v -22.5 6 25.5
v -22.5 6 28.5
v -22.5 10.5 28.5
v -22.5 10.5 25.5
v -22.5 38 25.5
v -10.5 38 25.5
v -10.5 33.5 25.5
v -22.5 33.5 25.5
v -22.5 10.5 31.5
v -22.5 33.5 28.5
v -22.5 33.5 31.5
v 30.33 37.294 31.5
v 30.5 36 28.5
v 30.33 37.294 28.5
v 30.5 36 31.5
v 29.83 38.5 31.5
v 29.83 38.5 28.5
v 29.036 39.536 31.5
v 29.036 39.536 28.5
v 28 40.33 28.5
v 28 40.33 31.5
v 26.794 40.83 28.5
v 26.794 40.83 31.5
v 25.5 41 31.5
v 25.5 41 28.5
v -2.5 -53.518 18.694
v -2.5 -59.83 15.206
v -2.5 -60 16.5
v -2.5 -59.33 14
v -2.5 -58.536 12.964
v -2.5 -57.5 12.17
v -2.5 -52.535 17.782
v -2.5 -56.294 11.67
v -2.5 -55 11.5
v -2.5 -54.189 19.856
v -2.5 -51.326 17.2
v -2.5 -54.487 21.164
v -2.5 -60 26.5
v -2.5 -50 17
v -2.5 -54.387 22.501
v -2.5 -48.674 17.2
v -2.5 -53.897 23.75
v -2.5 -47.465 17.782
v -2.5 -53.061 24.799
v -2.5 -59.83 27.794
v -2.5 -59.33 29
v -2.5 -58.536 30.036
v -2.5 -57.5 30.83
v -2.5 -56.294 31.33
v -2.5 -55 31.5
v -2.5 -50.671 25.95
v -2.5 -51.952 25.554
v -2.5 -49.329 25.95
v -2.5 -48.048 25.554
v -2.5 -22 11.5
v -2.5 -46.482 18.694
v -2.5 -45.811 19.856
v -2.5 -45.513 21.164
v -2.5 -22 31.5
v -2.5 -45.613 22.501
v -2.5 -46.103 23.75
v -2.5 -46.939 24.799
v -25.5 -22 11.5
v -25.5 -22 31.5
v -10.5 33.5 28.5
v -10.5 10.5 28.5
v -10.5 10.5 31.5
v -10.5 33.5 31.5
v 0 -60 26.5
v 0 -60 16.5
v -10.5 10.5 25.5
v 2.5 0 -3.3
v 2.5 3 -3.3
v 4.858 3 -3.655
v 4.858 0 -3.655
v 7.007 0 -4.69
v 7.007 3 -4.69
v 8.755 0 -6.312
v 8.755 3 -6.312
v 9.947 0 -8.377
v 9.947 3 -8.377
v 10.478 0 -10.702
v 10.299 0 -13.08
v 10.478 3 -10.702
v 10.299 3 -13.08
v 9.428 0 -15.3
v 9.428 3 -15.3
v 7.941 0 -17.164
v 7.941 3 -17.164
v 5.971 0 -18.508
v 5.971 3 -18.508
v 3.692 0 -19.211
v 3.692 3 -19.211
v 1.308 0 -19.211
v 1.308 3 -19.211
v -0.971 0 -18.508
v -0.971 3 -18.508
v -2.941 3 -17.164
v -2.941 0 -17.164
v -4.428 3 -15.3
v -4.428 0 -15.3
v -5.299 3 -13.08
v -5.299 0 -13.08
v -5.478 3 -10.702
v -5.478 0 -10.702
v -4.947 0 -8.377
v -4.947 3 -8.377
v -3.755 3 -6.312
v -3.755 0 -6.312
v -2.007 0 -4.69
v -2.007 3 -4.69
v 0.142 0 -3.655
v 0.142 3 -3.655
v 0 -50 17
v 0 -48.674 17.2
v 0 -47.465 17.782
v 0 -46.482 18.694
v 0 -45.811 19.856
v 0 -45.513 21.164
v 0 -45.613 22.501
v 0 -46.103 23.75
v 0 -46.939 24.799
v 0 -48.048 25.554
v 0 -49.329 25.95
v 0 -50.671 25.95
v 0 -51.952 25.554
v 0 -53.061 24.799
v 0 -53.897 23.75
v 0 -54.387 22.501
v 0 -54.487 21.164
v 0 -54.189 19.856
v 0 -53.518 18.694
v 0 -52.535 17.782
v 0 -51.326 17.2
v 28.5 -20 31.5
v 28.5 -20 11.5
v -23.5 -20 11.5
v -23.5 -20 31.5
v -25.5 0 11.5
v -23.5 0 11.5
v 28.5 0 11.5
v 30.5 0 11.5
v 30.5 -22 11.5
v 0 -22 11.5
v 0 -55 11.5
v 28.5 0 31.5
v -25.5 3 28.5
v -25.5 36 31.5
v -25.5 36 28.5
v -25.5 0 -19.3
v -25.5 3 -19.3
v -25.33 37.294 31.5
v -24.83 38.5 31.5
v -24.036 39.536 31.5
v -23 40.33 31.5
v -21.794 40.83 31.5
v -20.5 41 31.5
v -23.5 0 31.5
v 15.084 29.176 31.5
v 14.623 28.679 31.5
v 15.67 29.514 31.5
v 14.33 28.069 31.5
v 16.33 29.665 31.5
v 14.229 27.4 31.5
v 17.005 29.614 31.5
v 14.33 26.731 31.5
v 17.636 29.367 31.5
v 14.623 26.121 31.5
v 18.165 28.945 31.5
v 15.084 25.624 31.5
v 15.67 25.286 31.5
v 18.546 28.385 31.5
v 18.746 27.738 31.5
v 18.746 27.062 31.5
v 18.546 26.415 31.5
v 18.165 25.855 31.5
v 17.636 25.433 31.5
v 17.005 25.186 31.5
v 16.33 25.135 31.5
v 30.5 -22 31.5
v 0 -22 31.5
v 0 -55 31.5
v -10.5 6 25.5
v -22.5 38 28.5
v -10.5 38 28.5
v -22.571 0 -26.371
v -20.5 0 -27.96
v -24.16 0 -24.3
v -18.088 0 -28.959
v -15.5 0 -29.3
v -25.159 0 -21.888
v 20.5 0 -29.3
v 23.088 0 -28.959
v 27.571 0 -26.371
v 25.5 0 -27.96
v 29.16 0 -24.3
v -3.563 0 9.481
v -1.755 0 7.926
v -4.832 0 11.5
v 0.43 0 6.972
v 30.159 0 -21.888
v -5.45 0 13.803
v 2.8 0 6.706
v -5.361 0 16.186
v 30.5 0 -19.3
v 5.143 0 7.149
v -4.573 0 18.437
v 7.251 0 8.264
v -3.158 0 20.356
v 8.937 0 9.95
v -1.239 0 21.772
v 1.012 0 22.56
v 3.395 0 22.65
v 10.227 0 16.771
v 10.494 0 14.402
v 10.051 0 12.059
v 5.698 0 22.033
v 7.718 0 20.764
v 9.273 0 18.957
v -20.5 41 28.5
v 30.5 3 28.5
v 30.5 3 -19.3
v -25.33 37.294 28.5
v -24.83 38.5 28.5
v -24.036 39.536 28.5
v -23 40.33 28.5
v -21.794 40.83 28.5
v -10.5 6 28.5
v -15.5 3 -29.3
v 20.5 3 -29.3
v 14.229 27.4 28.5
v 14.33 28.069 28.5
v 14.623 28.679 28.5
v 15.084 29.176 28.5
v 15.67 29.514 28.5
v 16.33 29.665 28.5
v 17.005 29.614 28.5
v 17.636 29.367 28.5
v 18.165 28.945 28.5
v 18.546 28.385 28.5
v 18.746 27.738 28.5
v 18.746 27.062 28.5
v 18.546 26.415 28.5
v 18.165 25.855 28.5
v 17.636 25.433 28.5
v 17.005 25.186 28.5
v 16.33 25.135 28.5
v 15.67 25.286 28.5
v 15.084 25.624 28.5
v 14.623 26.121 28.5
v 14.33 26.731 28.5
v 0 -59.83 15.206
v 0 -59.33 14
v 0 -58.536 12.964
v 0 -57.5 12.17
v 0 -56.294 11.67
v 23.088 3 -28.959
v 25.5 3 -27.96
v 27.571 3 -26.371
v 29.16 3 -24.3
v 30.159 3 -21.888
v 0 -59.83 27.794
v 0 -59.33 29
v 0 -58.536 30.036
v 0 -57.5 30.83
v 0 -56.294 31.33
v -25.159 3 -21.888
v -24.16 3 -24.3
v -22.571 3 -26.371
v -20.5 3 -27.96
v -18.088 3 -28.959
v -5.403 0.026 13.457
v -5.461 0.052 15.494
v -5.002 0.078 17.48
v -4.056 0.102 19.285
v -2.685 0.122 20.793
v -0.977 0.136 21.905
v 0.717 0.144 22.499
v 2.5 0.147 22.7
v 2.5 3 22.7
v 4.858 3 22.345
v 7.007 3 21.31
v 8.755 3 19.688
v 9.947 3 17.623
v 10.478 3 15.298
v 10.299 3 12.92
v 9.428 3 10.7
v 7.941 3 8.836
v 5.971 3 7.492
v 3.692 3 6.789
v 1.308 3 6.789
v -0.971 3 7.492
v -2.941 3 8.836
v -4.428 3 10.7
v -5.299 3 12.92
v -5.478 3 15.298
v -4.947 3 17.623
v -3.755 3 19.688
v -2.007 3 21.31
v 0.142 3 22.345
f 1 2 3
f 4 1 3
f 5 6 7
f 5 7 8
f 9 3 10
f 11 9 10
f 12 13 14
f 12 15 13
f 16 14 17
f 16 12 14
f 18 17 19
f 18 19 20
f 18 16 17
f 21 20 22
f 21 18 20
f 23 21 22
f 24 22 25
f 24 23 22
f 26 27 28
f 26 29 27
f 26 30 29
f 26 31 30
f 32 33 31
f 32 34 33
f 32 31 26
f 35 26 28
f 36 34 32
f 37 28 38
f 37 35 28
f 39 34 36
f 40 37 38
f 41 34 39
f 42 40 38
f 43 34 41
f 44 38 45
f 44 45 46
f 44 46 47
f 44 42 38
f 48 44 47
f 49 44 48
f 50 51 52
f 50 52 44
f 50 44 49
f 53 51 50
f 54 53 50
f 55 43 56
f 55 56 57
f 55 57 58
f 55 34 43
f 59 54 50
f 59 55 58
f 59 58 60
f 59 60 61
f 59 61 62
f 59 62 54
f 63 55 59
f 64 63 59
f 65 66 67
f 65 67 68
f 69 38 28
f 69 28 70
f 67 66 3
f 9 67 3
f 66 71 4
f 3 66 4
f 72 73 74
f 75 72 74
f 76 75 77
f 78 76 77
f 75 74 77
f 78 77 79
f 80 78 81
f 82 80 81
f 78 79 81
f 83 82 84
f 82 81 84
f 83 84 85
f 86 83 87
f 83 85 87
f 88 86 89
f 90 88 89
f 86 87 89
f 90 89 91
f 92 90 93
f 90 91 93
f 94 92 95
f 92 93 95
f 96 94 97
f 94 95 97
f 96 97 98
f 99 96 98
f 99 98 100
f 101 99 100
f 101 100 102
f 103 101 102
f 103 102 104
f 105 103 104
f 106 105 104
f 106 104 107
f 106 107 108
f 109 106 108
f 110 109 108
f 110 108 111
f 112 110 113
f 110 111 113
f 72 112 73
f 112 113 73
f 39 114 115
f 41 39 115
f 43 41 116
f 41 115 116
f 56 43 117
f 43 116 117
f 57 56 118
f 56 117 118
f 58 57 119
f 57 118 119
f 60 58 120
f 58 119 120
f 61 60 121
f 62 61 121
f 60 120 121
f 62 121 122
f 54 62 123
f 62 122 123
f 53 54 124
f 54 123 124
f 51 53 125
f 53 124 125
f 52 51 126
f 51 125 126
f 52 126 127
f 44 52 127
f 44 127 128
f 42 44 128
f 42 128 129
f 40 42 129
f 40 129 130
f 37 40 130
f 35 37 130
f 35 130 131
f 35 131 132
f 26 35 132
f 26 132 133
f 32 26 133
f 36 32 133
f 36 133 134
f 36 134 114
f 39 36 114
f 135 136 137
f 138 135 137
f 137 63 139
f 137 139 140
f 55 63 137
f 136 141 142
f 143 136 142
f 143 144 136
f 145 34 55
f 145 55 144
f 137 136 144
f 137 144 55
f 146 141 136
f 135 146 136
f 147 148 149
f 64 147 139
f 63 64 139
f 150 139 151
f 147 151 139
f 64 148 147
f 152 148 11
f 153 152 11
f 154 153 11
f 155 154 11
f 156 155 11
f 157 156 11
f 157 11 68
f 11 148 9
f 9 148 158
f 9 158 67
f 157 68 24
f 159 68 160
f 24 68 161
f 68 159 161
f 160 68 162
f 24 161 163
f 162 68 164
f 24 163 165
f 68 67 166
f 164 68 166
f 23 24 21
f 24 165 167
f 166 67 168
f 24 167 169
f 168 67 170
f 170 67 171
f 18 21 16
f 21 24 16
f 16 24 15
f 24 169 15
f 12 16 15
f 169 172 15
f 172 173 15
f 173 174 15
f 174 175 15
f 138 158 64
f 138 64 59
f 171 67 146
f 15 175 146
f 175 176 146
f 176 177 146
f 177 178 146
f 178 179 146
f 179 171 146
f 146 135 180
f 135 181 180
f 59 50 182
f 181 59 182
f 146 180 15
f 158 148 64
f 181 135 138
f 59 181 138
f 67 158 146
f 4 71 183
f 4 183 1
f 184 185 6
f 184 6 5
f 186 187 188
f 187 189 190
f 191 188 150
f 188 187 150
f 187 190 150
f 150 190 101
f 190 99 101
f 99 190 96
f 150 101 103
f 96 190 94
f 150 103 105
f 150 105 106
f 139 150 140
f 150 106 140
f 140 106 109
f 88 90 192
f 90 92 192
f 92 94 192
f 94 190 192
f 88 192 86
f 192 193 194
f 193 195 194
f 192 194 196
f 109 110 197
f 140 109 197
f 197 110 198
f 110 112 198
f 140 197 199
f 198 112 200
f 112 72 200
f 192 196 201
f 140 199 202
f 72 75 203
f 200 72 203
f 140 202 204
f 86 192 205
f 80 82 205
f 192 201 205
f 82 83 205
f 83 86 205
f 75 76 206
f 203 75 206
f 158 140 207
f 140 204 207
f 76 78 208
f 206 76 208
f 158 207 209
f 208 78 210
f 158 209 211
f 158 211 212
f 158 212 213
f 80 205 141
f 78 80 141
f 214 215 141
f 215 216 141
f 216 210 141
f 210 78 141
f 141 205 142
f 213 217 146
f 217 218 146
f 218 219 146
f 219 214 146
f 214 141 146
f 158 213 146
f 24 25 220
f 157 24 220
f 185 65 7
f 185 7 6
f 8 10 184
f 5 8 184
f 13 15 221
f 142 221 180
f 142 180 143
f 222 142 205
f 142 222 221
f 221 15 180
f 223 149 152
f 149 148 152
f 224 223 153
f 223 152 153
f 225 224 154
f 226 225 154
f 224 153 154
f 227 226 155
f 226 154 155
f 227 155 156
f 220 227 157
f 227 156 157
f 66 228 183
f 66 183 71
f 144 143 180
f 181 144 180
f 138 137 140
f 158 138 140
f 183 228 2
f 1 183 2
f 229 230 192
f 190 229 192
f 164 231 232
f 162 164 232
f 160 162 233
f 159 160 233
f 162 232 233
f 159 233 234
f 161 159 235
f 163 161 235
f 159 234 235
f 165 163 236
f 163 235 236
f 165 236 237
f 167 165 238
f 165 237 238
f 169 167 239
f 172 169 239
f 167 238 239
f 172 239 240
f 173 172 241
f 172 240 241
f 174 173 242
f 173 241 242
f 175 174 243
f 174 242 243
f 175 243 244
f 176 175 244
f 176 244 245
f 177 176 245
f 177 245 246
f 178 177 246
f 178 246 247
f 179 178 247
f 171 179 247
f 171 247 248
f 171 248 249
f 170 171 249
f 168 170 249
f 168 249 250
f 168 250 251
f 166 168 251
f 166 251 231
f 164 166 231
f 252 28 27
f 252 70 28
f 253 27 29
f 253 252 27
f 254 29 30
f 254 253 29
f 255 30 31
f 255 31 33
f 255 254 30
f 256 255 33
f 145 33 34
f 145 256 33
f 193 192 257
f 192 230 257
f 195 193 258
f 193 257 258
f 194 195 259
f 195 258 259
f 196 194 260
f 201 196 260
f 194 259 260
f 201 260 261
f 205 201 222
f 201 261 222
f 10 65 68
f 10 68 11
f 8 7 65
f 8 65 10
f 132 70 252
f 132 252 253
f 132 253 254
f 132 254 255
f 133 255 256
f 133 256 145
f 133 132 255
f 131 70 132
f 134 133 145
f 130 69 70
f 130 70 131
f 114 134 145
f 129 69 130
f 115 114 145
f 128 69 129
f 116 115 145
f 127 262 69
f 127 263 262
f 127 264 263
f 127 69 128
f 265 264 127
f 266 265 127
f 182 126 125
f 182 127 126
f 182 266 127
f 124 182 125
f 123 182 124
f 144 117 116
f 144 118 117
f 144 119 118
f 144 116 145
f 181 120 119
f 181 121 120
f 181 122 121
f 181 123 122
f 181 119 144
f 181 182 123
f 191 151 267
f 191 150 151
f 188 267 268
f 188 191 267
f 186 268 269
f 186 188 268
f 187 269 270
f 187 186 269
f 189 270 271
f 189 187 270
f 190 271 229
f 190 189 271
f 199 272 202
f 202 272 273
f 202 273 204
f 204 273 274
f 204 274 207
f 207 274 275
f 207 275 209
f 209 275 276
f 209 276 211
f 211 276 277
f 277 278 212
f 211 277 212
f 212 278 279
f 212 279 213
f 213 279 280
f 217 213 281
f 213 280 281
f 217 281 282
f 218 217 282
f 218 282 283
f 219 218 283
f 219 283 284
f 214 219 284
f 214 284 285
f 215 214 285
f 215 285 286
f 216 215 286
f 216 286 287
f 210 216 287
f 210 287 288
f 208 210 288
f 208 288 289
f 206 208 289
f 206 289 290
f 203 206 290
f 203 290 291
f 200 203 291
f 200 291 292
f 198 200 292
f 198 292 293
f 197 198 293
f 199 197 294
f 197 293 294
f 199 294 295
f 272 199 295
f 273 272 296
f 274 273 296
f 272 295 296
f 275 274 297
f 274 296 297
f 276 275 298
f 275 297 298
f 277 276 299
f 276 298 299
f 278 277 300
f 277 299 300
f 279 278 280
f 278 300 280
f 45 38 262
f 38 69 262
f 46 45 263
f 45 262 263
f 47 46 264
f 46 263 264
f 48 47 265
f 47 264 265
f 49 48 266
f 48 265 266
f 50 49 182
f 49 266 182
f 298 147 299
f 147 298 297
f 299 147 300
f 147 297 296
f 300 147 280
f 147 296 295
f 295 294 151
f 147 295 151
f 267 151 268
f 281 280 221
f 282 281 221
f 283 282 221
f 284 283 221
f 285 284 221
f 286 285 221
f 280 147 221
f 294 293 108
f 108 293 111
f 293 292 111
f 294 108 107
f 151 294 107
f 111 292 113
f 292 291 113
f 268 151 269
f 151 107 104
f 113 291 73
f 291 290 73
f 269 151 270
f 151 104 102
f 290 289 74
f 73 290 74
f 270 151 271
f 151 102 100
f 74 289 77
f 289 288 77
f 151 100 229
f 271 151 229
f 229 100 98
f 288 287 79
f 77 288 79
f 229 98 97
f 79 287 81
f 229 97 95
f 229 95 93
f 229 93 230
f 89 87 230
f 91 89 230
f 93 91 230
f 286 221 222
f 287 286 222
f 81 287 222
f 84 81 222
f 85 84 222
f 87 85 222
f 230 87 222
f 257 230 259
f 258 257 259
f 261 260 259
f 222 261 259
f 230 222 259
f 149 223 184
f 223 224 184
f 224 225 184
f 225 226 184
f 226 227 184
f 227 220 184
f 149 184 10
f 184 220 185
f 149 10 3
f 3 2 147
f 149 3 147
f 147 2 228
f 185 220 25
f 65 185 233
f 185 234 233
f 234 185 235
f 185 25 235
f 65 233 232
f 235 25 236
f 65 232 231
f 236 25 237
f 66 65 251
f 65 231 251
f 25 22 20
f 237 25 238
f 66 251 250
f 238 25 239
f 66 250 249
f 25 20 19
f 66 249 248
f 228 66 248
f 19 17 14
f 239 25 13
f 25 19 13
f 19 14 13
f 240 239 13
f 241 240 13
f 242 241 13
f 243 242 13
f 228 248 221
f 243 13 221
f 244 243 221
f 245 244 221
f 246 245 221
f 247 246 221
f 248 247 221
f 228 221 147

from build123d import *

# Parameters (mm, degrees)
SKETCH1_W                = 50
SKETCH1_H                = 57.8
BOSS_EXTRUDE1_DEPTH      = 3
SKETCH1_3_W              = 50
SKETCH1_3_H              = 3
BOSS_EXTRUDE2_DEPTH      = 63
SKETCH7_W                = 10
SKETCH7_H                = 20
BOSS_EXTRUDE6_DEPTH      = 60
SKETCH8_W                = 7.5
SKETCH8_H                = 20
CUT_EXTRUDE4_DEPTH       = 60
SKETCH10_R               = 4.5
CUT_EXTRUDE5_DEPTH       = 60
FILLET1_R                = 5
FILLET2_R                = 5
CUT_EXTRUDE6_REACH       = 93.771
FILLET4_R                = 5
BOSS_EXTRUDE7_DEPTH      = 3
BOSS_EXTRUDE8_DEPTH      = 3
SKETCH15_R               = 8
CUT_EXTRUDE7_DEPTH       = 3
CUT_EXTRUDE8_DEPTH       = 40
BOSS_EXTRUDE9_DEPTH      = 23
BOSS_EXTRUDE9_DEPTH_BACK = 33
SKETCH17_W               = 20
SKETCH17_H               = 2
BOSS_EXTRUDE25_REACH     = 95.87
SKETCH19_W               = 54
SKETCH19_H               = 20
SKETCH19_W_2             = 2
CUT_EXTRUDE9_REACH       = 83.018
CUT_EXTRUDE10_REACH      = 78.756
SKETCH27_R               = 8
SKETCH28_W               = 12
SKETCH28_H               = 4.5
BOSS_EXTRUDE26_DEPTH     = 3
SKETCH28_3_W             = 12
SKETCH28_3_H             = 23
CUT_EXTRUDE11_DEPTH      = 3
SKETCH29_W               = 56
SKETCH29_H               = 22
CUT_EXTRUDE12_DEPTH      = 3
FILLET5_R                = 5
FILLET6_R                = 10
CUT_EXTRUDE13_REACH      = 90.719
SKETCH30_R               = 2.271159968


with BuildPart() as part:
    # Sketch1 → Boss-Extrude1 (new body)
    with BuildSketch(Plane(origin=(0, 0, 0), x_dir=(1, 0, 0), z_dir=(0, 1, 0))):
        with Locations((2.5, 0.4)):
            Rectangle(SKETCH1_W, SKETCH1_H)
    extrude(amount=BOSS_EXTRUDE1_DEPTH)

    # Sketch1<3> → Boss-Extrude2 (add)
    with BuildSketch(Plane(origin=(0, 0, 0), x_dir=(1, 0, 0), z_dir=(0, 1, 0))):
        with Locations((2.5, -30)):
            Rectangle(SKETCH1_3_W, SKETCH1_3_H)
    extrude(amount=BOSS_EXTRUDE2_DEPTH)

    # Sketch7 → Boss-Extrude6 (add)
    with BuildSketch(Plane.XZ):
        with Locations((2.5, 21.5)):
            Rectangle(SKETCH7_W, SKETCH7_H)
    extrude(amount=BOSS_EXTRUDE6_DEPTH)

    # Sketch8 → Cut-Extrude4 (cut)
    with BuildSketch(Plane(origin=(0, 0, 11.5), x_dir=(-1, 0, 0), z_dir=(0, 0, -1))):
        with Locations((-3.75, -50)):
            Rectangle(SKETCH8_W, SKETCH8_H)
    extrude(amount=-CUT_EXTRUDE4_DEPTH, mode=Mode.SUBTRACT)

    # Sketch10 → Cut-Extrude5 (cut)
    with BuildSketch(Plane(origin=(0, 0, 0), x_dir=(0, 0, -1), z_dir=(1, 0, 0))):
        with Locations((-21.5, -50)):
            Circle(SKETCH10_R)
    extrude(amount=-CUT_EXTRUDE5_DEPTH, mode=Mode.SUBTRACT)

    # Fillet1
    fillet1_edges = [part.edges().sort_by_distance(p)[0] for p in [
        (7.5, -20, 11.5),
    ]]
    fillet(fillet1_edges, radius=FILLET1_R)

    # Fillet2
    fillet2_edges = [part.edges().sort_by_distance(p)[0] for p in [
        (7.5, -20, 31.5),
    ]]
    fillet(fillet2_edges, radius=FILLET2_R)

    # Sketch11 → Cut-Extrude6 (cut, up to next)
    with BuildSketch(Plane.XY.offset(31.5), mode=Mode.PRIVATE) as cut_extrude6_sk1:
        with BuildLine():
            Line((7.5, -40), (0, -40))
            Line((0, -40), (0, -20))
            ThreePointArc((0, -20), (2.621852946, -15.723111223), (7.5, -14.552824164))
            Line((7.5, -14.552824164), (7.5, -40))
        make_face()
    cut_extrude6_tool1 = extrude(cut_extrude6_sk1.sketch, amount=-CUT_EXTRUDE6_REACH, mode=Mode.PRIVATE) & part.part
    add(cut_extrude6_tool1.solids().sort_by_distance((3.859065, -27.782641, 31.5))[0], mode=Mode.SUBTRACT)

    # Fillet4
    fillet4_edges = [part.edges().sort_by_distance(p)[0] for p in [
        (-1.25, -60, 11.5),
        (-1.25, -60, 31.5),
    ]]
    fillet(fillet4_edges, radius=FILLET4_R)

    # Sketch13 → Boss-Extrude7 (add)
    with BuildSketch(Plane(origin=(27.5, 0, 0), x_dir=(0, 0, -1), z_dir=(1, 0, 0))):
        Polygon((-31.5, 0), (29.3, 0), (29.3, 3), (-28.5, 3), (-28.5, 63), (-31.5, 63), align=None)
    extrude(amount=BOSS_EXTRUDE7_DEPTH)

    # Sketch14 → Boss-Extrude8 (add)
    with BuildSketch(Plane.ZY.offset(22.5)):
        Polygon((-29.3, 0), (31.5, 0), (31.5, 63), (28.5, 63), (28.5, 3), (-29.3, 3), align=None)
    extrude(amount=BOSS_EXTRUDE8_DEPTH)

    # Sketch15 → Cut-Extrude7 (cut)
    with BuildSketch(Plane(origin=(0, 3, 0), x_dir=(1, 0, 0), z_dir=(0, 1, 0))):
        with Locations(Location((2.5, 11.3, 0), (0, 0, 270))):
            Circle(SKETCH15_R)
        with Locations(Location((2.5, -14.7, 0), (0, 0, 270))):
            Circle(SKETCH15_R)
    extrude(amount=-CUT_EXTRUDE7_DEPTH, mode=Mode.SUBTRACT)

    # Sketch16 → Cut-Extrude8 (cut, symmetric)
    with BuildSketch(Plane(origin=(0, 0, 0), x_dir=(0, 0, -1), z_dir=(1, 0, 0))):
        Polygon((-31.5, -20), (-11.5, -20), (-11.5, 0), (-31.5, 0.262000387), align=None)
    extrude(amount=CUT_EXTRUDE8_DEPTH, both=True, mode=Mode.SUBTRACT)


with BuildPart() as cut_extrude8_piece_1:
    # of the separate pieces the step leaves, piece 1, a body of its own (cut_extrude8_pieces)
    add(part.part.solids().sort_by_distance((30.5, 63, 31.5))[0])



with BuildPart() as cut_extrude8_piece_2:
    # of the separate pieces the step leaves, piece 2, a body of its own (cut_extrude8_pieces)
    add(part.part.solids().sort_by_distance((0, -55, 31.5))[0])

    # Sketch17 → Boss-Extrude9 (add, two sides: drawn at the far end of the back side and taken through both)
    with BuildSketch(Plane.ZY.offset(2.5).offset(-BOSS_EXTRUDE9_DEPTH_BACK)):
        with Locations((21.5, -21)):
            Rectangle(SKETCH17_W, SKETCH17_H)
    extrude(amount=BOSS_EXTRUDE9_DEPTH + BOSS_EXTRUDE9_DEPTH_BACK)


with BuildPart() as cut_extrude8_piece_1_1:
    add(cut_extrude8_piece_1.part)

    add(cut_extrude8_piece_2.part)  # Boss-Extrude25 merges Cut-Extrude8 piece 2
    # Boss-Extrude25: up to this plane
    boss_extrude25_end = Plane(origin=(-40, 0, 11.5), z_dir=(0, 0.9999142057885084, -0.013098895462462855))
    # Sketch19 → Boss-Extrude25 (add, up to the surface)
    with BuildSketch(Plane(origin=(0, -20, 0), x_dir=(1, 0, 0), z_dir=(0, 1, 0)), mode=Mode.PRIVATE) as boss_extrude25_sk1:
        with Locations((1.5, -21.5)):
            Rectangle(SKETCH19_W, SKETCH19_H)
    boss_extrude25_tool1 = split(extrude(boss_extrude25_sk1.sketch, amount=BOSS_EXTRUDE25_REACH, mode=Mode.PRIVATE), bisect_by=boss_extrude25_end, keep=Keep.BOTH, mode=Mode.PRIVATE)
    add(boss_extrude25_tool1.solids().sort_by_distance((1.5, -20, 21.5))[0])
    # Sketch19 → Boss-Extrude25 (add, up to the surface)
    with BuildSketch(Plane(origin=(0, -20, 0), x_dir=(1, 0, 0), z_dir=(0, 1, 0)), mode=Mode.PRIVATE) as boss_extrude25_sk2:
        with Locations((29.5, -21.5)):
            Rectangle(SKETCH19_W_2, SKETCH19_H)
    boss_extrude25_tool2 = split(extrude(boss_extrude25_sk2.sketch, amount=BOSS_EXTRUDE25_REACH, mode=Mode.PRIVATE), bisect_by=boss_extrude25_end, keep=Keep.BOTH, mode=Mode.PRIVATE)
    add(boss_extrude25_tool2.solids().sort_by_distance((29.5, -20, 21.5))[0])

    # Sketch25 → Cut-Extrude9 (cut, up to next)
    with BuildSketch(Plane(origin=(0, 0, 11.5), x_dir=(-1, 0, 0), z_dir=(0, 0, -1)), mode=Mode.PRIVATE) as cut_extrude9_sk1:
        Polygon((-9.832121112, 0), (-28.5, 0), (-28.5, -20), (23.5, -20), (23.5, 0), (4.832121112, 0), align=None)
    cut_extrude9_tool1 = extrude(cut_extrude9_sk1.sketch, amount=-CUT_EXTRUDE9_REACH, mode=Mode.PRIVATE) & cut_extrude8_piece_1_1.part
    add(cut_extrude9_tool1.solids().sort_by_distance((2.5, -10, 11.5))[0], mode=Mode.SUBTRACT)

    # Sketch27 → Cut-Extrude10 (cut, up to next)
    with BuildSketch(Plane.XZ, mode=Mode.PRIVATE) as cut_extrude10_sk1:
        with Locations(Location((2.5, 14.7, 0), (0, 0, 90))):
            Circle(SKETCH27_R)
    cut_extrude10_tool1 = extrude(cut_extrude10_sk1.sketch, amount=-CUT_EXTRUDE10_REACH, mode=Mode.PRIVATE) & cut_extrude8_piece_1_1.part
    add(cut_extrude10_tool1.solids().sort_by_distance((2.5, 0, 14.7))[0], mode=Mode.SUBTRACT)

    # Sketch28 → Boss-Extrude26 (add)
    with BuildSketch(Plane(origin=(0, 0, 28.5), x_dir=(-1, 0, 0), z_dir=(0, 0, -1))):
        with Locations((16.5, 35.75)):
            Rectangle(SKETCH28_W, SKETCH28_H)
        with Locations((16.5, 8.25)):
            Rectangle(SKETCH28_W, SKETCH28_H)
    extrude(amount=BOSS_EXTRUDE26_DEPTH)

    # Sketch28<3> → Cut-Extrude11 (cut)
    with BuildSketch(Plane(origin=(0, 0, 28.5), x_dir=(-1, 0, 0), z_dir=(0, 0, -1))):
        with Locations((16.5, 22)):
            Rectangle(SKETCH28_3_W, SKETCH28_3_H)
    extrude(amount=-CUT_EXTRUDE11_DEPTH, mode=Mode.SUBTRACT)

    # Sketch29 → Cut-Extrude12 (cut)
    with BuildSketch(Plane(origin=(0, 0, 28.5), x_dir=(-1, 0, 0), z_dir=(0, 0, -1))):
        with Locations((-2.5, 52)):
            Rectangle(SKETCH29_W, SKETCH29_H)
    extrude(amount=-CUT_EXTRUDE12_DEPTH, mode=Mode.SUBTRACT)

    # Fillet5
    fillet5_edges = [cut_extrude8_piece_1_1.edges().sort_by_distance(p)[0] for p in [
        (-25.5, 41, 30),
        (30.5, 41, 30),
    ]]
    fillet(fillet5_edges, radius=FILLET5_R)

    # Fillet6
    fillet6_edges = [cut_extrude8_piece_1_1.edges().sort_by_distance(p)[0] for p in [
        (30.5, 1.5, -29.3),
        (-25.5, 1.5, -29.3),
    ]]
    fillet(fillet6_edges, radius=FILLET6_R)

    # Sketch30 → Cut-Extrude13 (cut, up to next)
    with BuildSketch(Plane(origin=(0, 0, 28.5), x_dir=(-1, 0, 0), z_dir=(0, 0, -1)), mode=Mode.PRIVATE) as cut_extrude13_sk1:
        with Locations((-16.5, 27.4)):
            Circle(SKETCH30_R)
    cut_extrude13_tool1 = extrude(cut_extrude13_sk1.sketch, amount=-CUT_EXTRUDE13_REACH, mode=Mode.PRIVATE) & cut_extrude8_piece_1_1.part
    add(cut_extrude13_tool1.solids().sort_by_distance((16.5, 27.4, 28.5))[0], mode=Mode.SUBTRACT)


solid = cut_extrude8_piece_1_1.part
